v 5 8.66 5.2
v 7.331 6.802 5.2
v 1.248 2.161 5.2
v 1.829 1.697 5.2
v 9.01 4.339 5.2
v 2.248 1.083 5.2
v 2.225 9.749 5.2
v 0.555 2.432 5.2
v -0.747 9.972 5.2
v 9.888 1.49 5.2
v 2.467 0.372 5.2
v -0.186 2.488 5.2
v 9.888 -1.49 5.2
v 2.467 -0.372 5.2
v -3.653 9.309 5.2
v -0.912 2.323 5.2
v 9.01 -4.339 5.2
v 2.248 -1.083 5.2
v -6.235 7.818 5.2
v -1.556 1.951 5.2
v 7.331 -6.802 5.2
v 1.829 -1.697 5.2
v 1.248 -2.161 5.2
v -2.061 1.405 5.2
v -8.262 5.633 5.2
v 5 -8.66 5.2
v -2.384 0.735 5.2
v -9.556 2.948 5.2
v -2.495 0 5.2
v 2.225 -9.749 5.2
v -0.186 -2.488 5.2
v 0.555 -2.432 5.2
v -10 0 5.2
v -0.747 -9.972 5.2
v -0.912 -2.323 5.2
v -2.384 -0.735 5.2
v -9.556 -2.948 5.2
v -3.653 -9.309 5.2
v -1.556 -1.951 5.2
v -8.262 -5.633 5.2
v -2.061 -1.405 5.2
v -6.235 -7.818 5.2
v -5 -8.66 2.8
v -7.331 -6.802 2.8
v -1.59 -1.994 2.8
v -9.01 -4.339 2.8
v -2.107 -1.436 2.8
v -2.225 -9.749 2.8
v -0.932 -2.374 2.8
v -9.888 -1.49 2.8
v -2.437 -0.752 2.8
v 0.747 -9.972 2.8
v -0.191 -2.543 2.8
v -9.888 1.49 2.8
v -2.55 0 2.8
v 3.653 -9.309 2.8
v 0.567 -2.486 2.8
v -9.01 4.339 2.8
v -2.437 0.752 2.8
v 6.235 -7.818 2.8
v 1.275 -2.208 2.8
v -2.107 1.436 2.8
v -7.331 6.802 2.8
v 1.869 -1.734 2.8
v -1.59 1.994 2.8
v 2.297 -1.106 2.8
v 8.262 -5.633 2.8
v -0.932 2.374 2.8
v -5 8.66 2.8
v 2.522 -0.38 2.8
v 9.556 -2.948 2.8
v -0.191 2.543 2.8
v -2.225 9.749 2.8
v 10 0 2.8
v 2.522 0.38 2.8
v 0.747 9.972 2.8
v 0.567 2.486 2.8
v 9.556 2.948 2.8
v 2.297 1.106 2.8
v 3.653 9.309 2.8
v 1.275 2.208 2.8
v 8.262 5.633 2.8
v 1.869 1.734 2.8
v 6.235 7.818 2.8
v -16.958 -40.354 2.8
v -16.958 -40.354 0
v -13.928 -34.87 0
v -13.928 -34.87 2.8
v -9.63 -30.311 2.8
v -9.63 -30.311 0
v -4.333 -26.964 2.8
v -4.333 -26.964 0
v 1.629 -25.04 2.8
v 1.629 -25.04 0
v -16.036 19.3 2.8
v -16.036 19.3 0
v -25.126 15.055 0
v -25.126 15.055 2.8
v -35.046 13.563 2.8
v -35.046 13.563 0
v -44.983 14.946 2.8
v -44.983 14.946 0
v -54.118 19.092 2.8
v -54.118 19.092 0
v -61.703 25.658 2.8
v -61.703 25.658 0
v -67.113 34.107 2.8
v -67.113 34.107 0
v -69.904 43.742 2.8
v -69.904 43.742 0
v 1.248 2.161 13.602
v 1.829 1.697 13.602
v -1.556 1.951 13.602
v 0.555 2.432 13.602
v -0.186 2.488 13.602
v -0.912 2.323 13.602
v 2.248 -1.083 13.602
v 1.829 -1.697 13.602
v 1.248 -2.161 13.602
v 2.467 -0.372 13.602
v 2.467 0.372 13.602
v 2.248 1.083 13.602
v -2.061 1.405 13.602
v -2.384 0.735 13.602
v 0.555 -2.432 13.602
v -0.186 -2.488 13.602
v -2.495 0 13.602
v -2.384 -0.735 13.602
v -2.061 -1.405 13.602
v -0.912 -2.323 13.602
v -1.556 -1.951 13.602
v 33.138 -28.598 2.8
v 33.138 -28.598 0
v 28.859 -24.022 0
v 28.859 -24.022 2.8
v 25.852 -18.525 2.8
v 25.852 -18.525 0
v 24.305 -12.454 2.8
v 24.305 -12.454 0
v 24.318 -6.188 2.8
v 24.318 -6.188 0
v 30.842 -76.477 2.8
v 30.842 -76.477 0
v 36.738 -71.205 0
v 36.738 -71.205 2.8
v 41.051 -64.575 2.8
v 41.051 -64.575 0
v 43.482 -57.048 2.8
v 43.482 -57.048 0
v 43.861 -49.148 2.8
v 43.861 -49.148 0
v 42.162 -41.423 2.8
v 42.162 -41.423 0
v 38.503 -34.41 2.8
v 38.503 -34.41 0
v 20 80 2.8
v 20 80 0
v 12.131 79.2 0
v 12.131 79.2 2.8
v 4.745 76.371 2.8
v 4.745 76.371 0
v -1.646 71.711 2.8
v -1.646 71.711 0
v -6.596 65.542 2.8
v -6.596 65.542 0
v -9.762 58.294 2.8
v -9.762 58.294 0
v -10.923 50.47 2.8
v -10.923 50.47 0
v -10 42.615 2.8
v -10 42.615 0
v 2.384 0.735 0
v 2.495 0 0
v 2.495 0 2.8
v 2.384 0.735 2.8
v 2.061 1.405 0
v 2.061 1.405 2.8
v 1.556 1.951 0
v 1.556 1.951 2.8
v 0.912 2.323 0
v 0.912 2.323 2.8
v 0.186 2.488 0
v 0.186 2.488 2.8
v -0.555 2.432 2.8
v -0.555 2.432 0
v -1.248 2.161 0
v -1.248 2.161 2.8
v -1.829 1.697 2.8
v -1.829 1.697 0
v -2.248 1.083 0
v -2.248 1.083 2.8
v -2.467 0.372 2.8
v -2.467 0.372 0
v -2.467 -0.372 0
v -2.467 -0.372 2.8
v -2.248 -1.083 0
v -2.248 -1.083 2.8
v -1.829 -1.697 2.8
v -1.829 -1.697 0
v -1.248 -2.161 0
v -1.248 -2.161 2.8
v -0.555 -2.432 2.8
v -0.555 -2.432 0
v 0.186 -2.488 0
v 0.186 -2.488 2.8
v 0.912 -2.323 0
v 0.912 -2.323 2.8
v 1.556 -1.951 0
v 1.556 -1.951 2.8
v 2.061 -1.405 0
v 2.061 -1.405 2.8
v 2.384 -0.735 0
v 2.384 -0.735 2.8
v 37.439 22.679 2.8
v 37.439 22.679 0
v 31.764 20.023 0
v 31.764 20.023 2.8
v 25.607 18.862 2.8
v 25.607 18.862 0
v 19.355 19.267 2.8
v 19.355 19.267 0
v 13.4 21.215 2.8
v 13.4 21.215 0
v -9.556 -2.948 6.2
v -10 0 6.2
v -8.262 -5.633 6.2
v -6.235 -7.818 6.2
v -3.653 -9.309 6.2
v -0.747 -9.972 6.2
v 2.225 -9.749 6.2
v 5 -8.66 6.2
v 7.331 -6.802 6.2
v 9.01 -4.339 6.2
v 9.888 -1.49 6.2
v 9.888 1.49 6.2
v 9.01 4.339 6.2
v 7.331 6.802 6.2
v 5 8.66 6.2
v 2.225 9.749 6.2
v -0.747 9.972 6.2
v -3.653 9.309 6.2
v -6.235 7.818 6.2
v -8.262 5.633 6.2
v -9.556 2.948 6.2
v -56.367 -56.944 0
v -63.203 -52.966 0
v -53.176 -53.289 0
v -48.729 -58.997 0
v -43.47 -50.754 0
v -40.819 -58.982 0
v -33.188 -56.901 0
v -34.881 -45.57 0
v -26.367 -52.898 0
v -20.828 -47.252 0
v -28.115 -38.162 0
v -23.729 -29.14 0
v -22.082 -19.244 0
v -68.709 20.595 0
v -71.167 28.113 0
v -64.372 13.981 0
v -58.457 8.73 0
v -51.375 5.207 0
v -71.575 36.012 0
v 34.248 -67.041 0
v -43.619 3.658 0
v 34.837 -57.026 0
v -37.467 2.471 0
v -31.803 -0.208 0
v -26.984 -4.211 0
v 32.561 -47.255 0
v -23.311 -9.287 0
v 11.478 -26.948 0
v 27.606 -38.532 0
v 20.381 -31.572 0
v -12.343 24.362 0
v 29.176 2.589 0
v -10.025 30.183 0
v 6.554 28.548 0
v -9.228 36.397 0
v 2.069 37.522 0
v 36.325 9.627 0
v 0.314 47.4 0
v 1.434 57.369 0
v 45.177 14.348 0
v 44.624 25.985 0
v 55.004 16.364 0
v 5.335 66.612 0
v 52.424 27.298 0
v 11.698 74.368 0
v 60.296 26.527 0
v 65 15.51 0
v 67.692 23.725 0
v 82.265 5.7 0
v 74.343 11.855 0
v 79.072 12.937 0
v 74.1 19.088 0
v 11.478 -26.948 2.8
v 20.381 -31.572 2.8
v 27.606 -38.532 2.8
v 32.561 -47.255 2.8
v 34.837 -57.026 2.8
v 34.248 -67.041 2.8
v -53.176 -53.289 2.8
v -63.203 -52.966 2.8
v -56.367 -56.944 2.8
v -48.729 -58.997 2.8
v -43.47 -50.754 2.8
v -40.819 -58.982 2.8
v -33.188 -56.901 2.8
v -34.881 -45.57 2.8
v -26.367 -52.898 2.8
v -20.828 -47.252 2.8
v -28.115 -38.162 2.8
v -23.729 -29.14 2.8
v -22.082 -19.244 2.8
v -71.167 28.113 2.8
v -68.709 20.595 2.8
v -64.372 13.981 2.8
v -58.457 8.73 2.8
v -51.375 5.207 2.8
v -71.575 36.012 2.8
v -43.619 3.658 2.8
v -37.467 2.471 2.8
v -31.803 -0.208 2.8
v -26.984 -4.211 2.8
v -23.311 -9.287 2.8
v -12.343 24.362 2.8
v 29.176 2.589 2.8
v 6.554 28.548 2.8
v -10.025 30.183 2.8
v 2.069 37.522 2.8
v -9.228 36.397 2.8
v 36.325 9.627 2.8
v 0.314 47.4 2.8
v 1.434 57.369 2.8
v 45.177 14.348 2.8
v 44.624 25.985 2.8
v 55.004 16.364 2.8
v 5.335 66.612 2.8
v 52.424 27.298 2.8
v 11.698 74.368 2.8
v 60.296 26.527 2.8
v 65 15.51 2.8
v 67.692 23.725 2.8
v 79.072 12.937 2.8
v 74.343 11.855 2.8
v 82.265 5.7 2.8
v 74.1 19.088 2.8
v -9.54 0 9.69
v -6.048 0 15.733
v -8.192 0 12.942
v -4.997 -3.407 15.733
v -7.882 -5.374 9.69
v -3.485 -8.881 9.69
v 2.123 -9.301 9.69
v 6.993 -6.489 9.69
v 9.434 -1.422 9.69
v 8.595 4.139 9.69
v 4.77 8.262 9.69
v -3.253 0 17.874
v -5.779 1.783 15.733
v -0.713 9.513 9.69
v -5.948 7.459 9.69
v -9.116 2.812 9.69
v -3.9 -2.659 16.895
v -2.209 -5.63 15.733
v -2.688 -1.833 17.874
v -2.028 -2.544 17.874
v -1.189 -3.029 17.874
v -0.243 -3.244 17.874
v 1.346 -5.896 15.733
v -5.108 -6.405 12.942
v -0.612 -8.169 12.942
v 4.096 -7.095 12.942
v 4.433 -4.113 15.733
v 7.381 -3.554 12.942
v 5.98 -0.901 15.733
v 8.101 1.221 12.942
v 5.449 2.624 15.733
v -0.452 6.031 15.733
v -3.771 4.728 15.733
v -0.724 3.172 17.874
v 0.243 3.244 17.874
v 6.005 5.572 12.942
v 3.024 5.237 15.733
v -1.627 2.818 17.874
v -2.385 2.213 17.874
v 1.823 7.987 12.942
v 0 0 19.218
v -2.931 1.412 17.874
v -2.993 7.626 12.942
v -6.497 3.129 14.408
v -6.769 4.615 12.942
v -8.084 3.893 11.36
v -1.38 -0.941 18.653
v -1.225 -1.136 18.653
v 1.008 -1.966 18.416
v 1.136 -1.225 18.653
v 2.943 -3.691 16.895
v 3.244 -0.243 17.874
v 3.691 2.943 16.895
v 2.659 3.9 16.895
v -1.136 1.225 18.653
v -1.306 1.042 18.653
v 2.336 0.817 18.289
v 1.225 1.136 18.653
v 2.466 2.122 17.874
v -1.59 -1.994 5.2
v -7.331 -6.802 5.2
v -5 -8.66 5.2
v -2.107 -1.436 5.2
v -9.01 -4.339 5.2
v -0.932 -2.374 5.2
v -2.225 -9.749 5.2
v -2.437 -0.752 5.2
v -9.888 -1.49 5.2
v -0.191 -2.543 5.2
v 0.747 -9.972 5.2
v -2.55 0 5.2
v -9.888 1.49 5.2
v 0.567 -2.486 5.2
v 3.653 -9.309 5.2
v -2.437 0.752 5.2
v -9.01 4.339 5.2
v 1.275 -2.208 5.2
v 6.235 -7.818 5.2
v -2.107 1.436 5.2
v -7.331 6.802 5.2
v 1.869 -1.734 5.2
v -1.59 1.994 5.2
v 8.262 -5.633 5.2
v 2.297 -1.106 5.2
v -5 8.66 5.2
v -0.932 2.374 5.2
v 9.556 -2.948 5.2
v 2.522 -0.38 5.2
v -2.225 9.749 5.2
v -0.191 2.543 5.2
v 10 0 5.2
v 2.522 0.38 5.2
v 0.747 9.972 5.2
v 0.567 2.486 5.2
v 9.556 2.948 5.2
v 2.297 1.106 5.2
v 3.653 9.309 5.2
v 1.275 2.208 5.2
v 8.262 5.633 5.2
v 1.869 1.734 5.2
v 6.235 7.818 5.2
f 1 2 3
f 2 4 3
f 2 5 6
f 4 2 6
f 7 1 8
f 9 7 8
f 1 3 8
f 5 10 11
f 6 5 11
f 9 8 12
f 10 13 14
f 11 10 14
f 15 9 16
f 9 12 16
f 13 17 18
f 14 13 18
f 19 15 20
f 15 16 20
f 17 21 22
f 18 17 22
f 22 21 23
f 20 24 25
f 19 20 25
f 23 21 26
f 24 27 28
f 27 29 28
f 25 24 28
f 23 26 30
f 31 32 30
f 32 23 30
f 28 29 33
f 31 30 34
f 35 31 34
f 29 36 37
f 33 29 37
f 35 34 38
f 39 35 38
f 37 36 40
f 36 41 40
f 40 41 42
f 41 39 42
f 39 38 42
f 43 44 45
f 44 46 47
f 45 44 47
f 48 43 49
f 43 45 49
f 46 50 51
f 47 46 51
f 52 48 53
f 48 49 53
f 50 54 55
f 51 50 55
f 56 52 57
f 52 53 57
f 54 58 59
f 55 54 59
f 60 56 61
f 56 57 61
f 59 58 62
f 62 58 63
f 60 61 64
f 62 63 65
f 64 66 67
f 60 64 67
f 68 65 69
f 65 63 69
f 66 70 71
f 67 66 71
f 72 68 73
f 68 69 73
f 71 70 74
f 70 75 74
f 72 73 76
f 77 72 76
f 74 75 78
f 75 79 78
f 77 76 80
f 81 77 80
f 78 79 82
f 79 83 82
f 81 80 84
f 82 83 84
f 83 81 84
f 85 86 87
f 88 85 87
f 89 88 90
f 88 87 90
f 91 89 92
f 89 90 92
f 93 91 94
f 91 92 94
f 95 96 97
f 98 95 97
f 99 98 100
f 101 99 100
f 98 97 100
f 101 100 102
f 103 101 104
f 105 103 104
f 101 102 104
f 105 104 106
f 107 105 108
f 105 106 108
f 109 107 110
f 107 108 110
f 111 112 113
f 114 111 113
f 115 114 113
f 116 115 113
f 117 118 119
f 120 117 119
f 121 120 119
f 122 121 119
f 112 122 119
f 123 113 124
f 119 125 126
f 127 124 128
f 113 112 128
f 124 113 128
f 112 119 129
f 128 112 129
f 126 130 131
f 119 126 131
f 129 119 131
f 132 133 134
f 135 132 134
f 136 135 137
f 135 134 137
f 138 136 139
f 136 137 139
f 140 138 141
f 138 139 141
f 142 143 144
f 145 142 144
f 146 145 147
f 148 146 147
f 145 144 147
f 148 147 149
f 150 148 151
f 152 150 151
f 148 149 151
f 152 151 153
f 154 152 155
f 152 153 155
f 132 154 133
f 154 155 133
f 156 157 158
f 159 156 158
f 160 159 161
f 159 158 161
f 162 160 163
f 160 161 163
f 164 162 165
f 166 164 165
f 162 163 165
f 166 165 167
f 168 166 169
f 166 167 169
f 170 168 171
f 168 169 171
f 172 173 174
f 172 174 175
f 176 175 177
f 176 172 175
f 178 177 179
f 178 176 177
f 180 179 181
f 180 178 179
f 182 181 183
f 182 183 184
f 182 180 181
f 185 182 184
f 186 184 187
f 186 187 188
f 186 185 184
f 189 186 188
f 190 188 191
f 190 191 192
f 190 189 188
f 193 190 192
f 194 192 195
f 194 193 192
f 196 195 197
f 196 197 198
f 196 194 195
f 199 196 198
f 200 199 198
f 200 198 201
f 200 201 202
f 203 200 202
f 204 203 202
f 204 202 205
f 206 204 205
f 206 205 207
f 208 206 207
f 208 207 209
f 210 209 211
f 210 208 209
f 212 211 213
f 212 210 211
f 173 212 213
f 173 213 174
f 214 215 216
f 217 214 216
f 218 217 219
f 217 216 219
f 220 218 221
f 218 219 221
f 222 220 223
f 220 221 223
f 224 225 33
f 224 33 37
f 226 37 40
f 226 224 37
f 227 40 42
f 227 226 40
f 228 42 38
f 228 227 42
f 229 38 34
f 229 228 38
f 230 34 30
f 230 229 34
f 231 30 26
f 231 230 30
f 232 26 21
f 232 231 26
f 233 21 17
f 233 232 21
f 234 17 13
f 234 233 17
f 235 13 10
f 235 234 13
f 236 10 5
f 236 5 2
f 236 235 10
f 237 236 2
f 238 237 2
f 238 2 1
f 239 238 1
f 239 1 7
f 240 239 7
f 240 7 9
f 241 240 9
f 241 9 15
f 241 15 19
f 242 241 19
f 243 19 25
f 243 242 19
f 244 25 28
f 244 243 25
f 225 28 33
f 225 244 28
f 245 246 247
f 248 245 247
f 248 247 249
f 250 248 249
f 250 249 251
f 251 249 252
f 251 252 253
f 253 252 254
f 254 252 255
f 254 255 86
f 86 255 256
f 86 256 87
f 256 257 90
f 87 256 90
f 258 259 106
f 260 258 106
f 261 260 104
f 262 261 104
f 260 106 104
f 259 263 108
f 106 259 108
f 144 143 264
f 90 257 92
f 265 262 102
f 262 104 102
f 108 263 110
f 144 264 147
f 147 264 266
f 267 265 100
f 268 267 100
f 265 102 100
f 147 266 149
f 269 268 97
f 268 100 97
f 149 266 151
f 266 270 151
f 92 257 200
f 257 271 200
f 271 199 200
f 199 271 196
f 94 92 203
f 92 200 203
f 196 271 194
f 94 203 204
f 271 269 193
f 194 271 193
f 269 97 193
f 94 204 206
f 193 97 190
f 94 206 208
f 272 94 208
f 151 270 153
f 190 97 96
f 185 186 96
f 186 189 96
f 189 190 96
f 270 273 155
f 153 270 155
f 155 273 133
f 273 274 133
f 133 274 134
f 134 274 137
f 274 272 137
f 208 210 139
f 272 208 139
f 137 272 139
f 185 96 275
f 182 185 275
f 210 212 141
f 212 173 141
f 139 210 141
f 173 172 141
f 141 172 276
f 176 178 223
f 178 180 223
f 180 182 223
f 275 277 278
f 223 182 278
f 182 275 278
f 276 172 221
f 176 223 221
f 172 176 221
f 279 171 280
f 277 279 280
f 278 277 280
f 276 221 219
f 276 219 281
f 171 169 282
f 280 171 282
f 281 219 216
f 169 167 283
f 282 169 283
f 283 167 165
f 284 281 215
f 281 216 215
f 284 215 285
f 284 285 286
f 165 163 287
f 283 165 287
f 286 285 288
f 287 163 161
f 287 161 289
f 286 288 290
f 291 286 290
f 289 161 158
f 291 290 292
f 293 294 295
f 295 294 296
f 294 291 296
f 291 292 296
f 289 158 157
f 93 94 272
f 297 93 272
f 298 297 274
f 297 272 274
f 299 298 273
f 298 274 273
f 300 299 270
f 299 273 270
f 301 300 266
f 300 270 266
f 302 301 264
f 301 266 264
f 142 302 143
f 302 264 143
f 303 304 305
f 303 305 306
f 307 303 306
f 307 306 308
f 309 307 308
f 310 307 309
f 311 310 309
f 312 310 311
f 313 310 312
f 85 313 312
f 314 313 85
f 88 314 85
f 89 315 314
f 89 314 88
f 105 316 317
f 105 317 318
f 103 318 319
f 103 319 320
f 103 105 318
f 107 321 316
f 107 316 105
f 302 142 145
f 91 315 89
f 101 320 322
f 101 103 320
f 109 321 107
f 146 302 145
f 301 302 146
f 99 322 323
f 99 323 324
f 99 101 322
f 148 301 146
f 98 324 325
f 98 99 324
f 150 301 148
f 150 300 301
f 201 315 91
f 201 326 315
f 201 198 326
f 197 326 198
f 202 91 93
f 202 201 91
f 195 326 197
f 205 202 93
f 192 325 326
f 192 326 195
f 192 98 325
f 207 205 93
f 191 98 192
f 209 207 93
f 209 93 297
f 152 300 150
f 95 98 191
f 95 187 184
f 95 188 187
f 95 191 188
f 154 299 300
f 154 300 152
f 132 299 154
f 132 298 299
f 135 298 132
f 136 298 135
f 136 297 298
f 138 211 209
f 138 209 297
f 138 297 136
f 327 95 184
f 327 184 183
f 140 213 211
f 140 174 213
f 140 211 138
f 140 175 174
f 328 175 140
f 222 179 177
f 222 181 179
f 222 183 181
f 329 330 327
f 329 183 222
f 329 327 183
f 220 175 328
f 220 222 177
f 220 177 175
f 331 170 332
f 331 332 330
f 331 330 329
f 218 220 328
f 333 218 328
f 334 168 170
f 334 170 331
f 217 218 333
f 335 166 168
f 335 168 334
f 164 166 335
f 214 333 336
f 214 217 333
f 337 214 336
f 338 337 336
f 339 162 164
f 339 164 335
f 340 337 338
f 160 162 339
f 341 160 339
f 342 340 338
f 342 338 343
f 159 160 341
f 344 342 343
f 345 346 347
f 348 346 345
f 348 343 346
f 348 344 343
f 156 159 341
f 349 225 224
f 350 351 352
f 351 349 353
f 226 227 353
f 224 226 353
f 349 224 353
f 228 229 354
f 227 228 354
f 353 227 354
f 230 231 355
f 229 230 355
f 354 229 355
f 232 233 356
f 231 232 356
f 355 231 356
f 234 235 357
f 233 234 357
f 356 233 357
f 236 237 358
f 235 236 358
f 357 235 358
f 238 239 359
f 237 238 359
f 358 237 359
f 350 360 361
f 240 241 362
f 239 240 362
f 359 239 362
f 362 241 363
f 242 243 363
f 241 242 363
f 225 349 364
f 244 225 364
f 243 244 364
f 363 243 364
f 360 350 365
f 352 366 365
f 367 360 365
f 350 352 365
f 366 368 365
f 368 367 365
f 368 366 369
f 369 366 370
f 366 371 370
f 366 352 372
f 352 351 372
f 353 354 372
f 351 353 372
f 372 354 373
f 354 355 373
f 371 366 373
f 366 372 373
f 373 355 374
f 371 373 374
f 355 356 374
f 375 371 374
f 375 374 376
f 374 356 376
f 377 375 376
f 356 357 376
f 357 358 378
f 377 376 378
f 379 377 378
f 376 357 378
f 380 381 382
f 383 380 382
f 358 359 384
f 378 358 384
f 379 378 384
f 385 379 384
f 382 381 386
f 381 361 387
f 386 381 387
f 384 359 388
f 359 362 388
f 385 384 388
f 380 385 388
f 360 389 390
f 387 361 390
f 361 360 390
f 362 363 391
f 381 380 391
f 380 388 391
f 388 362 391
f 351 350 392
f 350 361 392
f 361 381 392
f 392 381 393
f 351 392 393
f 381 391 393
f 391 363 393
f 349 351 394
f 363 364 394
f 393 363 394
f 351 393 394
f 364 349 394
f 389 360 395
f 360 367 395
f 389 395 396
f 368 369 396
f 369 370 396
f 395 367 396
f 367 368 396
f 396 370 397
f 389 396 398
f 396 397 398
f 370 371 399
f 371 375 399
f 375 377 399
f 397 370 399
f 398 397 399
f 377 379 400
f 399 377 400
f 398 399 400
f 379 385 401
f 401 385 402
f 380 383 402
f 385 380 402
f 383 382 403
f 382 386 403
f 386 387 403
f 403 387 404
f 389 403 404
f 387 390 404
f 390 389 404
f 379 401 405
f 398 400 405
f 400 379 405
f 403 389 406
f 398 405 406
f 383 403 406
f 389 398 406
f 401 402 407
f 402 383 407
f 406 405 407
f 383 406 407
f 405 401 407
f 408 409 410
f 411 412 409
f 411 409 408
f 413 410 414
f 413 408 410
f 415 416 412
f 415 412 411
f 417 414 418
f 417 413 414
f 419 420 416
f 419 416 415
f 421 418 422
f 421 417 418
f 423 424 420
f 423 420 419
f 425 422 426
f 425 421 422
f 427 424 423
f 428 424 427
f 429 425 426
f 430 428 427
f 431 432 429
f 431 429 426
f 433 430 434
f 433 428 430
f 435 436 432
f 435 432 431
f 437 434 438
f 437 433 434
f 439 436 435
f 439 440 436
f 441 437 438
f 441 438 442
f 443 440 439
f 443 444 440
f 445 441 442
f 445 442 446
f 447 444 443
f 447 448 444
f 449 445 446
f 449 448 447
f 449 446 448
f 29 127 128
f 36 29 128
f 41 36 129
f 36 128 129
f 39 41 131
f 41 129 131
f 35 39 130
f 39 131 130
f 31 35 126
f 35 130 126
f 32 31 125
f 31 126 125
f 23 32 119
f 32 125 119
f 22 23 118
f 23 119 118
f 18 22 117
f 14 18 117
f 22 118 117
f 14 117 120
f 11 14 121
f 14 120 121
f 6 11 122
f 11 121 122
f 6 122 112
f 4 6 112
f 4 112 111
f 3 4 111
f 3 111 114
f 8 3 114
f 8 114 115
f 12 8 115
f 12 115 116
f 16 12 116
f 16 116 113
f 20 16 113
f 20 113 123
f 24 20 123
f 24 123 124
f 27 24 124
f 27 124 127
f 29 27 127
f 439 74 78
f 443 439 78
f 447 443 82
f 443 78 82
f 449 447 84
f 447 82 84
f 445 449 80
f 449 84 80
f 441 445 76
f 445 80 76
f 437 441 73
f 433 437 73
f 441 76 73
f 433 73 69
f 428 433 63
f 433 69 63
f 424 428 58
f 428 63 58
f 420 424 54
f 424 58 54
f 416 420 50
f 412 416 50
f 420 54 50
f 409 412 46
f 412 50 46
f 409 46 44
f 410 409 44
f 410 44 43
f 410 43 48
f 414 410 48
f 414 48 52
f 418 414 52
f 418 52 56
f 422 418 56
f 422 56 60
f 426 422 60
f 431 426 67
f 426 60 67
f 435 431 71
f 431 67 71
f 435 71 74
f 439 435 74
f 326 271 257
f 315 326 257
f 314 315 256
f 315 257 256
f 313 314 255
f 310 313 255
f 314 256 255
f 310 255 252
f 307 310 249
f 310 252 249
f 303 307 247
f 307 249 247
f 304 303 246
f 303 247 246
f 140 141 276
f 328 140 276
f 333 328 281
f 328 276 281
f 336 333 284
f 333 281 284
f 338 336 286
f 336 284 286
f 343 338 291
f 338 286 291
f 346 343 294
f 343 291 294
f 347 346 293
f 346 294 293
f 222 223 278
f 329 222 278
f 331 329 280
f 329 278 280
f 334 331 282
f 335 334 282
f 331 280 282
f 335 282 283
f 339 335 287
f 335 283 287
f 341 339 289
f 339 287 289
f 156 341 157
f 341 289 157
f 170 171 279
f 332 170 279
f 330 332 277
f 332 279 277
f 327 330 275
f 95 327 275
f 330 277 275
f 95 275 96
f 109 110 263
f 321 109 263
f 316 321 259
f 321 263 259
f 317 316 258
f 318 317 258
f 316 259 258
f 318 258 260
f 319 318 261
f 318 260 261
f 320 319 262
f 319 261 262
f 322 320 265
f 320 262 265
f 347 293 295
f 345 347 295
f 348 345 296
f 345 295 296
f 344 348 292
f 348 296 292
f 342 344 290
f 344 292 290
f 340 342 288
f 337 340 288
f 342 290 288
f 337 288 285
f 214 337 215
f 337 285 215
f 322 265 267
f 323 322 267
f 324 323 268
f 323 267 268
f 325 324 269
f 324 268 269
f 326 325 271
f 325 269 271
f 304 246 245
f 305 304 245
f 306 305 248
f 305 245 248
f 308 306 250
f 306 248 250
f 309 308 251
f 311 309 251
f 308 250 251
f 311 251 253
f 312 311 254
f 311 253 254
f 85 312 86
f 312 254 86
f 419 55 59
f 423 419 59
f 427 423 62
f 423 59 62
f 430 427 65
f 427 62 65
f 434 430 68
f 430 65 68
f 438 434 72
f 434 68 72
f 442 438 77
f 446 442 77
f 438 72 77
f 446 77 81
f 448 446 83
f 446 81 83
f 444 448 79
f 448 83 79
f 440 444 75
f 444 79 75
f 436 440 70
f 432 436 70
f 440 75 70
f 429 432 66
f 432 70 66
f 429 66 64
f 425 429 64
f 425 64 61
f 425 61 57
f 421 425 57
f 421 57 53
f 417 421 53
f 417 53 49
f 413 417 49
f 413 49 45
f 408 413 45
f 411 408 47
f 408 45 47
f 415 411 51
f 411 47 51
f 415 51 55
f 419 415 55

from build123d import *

# Parameters (mm, degrees)
F0_R     = 2.495
F1_DEPTH = 2.8
F3_DEPTH = 2.4
F5_DEPTH = 1
F6_W     = 7.505
F6_H     = 1


with BuildPart() as f1:
    # F0 (on Top) → F1 (new body)
    with BuildSketch(Plane.XY):
        with BuildLine():
            ThreePointArc((-22.7858082993, 10.2862500528), (-20.3407682899, 14.5345500576), (-17.1137876985, 18.2241123408))
            ThreePointArc((-17.1137876985, 18.2241123408), (-16.5666860585, 18.7537908739), (-16.0359703203, 19.2998864317))
            ThreePointArc((-16.0359703203, 19.2998864317), (-49.6996912533, 16.6900208036), (-69.9041814161, 43.7424898759))
            ThreePointArc((-69.9041814161, 43.7424898759), (-66.7598038962, 17.1440537541), (-43.6190942577, 3.6580806138))
            ThreePointArc((-43.6190942577, 3.6580806138), (-32.5771806136, 5.0068500705), (-22.7858082993, 10.2862500528))
        make_face()
        with BuildLine():
            ThreePointArc((-23.7810968086, -7.7109943963), (-24.9618581995, 1.3804474739), (-22.7858082993, 10.2862500528))
            ThreePointArc((-22.7858082993, 10.2862500528), (-32.5771806136, 5.0068500705), (-43.6190942577, 3.6580806138))
            ThreePointArc((-43.6190942577, 3.6580806138), (-31.8033376807, -0.2078903454), (-23.3106701049, -9.2871211714))
            ThreePointArc((-23.3106701049, -9.2871211714), (-23.5366233714, -8.4962939253), (-23.7810968086, -7.7109943963))
        make_face()
        with BuildLine():
            ThreePointArc((-14.6823545264, 20.2343387725), (-6.4007548293, 24.1667196288), (2.7416031459, 24.8492175368))
            ThreePointArc((2.7416031459, 24.8492175368), (-5.3051050528, 32.5299416652), (-10, 42.6146329052))
            ThreePointArc((-10, 42.6146329052), (-10.0254872889, 30.1825298915), (-16.0359703203, 19.2998864317))
            ThreePointArc((-16.0359703203, 19.2998864317), (-15.353672314, 19.7591598168), (-14.6823545264, 20.2343387725))
        make_face()
        with BuildLine():
            ThreePointArc((-17.1137876985, 18.2241123408), (-15.9298122297, 19.2676174533), (-14.6823545264, 20.2343387725))
            ThreePointArc((-14.6823545264, 20.2343387725), (-15.353672314, 19.7591598168), (-16.0359703203, 19.2998864317))
            ThreePointArc((-16.0359703203, 19.2998864317), (-16.5666860585, 18.7537908739), (-17.1137876985, 18.2241123408))
        make_face()
        with BuildLine():
            ThreePointArc((24.5572095563, -4.684384571), (24.8890562186, -2.3526326842), (25, 0))
            ThreePointArc((25, 0), (24.8697135657, 2.5489894392), (24.4802122271, 5.0714109788))
            ThreePointArc((24.4802122271, 5.0714109788), (21.0059741613, 13.5554066532), (14.7069026764, 20.2165034976))
            ThreePointArc((14.7069026764, 20.2165034976), (13.4020104362, 21.1041729586), (12.0437095584, 21.9077397299))
            ThreePointArc((12.0437095584, 21.9077397299), (7.5375354635, 23.8366432019), (2.7416031459, 24.8492175368))
            ThreePointArc((2.7416031459, 24.8492175368), (-6.4007548293, 24.1667196288), (-14.6823545264, 20.2343387725))
            ThreePointArc((-14.6823545264, 20.2343387725), (-15.9298122297, 19.2676174533), (-17.1137876985, 18.2241123408))
            ThreePointArc((-17.1137876985, 18.2241123408), (-20.3407682899, 14.5345500576), (-22.7858082993, 10.2862500528))
            ThreePointArc((-22.7858082993, 10.2862500528), (-24.9618581995, 1.3804474739), (-23.7810968086, -7.7109943963))
            ThreePointArc((-23.7810968086, -7.7109943963), (-23.2471758286, -9.1961304903), (-22.6206120324, -10.6446188885))
            ThreePointArc((-22.6206120324, -10.6446188885), (-20.1088216239, -14.8537972551), (-16.824007136, -18.4919653874))
            ThreePointArc((-16.824007136, -18.4919653874), (-9.0265219603, -23.3135561702), (-0.015171591, -24.9999953965))
            ThreePointArc((-0.015171591, -24.9999953965), (1.5622674252, -24.9511386612), (3.1334806162, -24.8028486112))
            ThreePointArc((3.1334806162, -24.8028486112), (7.9128330526, -23.7147016233), (12.3880000622, -21.714913181))
            ThreePointArc((12.3880000622, -21.714913181), (19.3831608278, -15.7890175857), (23.7717202497, -7.7398524773))
            ThreePointArc((23.7717202497, -7.7398524773), (24.2127101969, -6.2245212604), (24.5572095563, -4.684384571))
        make_face()
        Circle(F0_R, mode=Mode.SUBTRACT)
        with BuildLine():
            ThreePointArc((2.7416031459, 24.8492175368), (7.5375354635, 23.8366432019), (12.0437095584, 21.9077397299))
            ThreePointArc((12.0437095584, 21.9077397299), (12.7165274833, 21.5510948184), (13.3998954043, 21.2151069652))
            ThreePointArc((13.3998954043, 21.2151069652), (0.5151038299, 52.4247152891), (20, 80))
            ThreePointArc((20, 80), (-4.3249499065, 68.7901504845), (-10, 42.6146329052))
            ThreePointArc((-10, 42.6146329052), (-5.3051050528, 32.5299416652), (2.7416031459, 24.8492175368))
        make_face()
        with BuildLine():
            ThreePointArc((14.7069026764, 20.2165034976), (21.0059741613, 13.5554066532), (24.4802122271, 5.0714109788))
            ThreePointArc((24.4802122271, 5.0714109788), (29.2984453771, 15.0977595306), (37.4387543702, 22.6792109397))
            ThreePointArc((37.4387543702, 22.6792109397), (25.6072457824, 18.8617196848), (13.3998954043, 21.2151069652))
            ThreePointArc((13.3998954043, 21.2151069652), (14.0475320292, 20.7081262812), (14.7069026764, 20.2165034976))
        make_face()
        with BuildLine():
            ThreePointArc((24.4802122271, 5.0714109788), (24.8697135657, 2.5489894392), (25, 0))
            ThreePointArc((25, 0), (24.8890562186, -2.3526326842), (24.5572095563, -4.684384571))
            ThreePointArc((24.5572095563, -4.684384571), (24.4259322621, -5.4344817814), (24.3175611259, -6.1882292523))
            ThreePointArc((24.3175611259, -6.1882292523), (50.0180429279, 15.7102350956), (82.2648611911, 5.7002292241))
            ThreePointArc((82.2648611911, 5.7002292241), (64.0868378543, 25.3705973366), (37.4387543702, 22.6792109397))
            ThreePointArc((37.4387543702, 22.6792109397), (29.2984453771, 15.0977595306), (24.4802122271, 5.0714109788))
        make_face()
        with BuildLine():
            ThreePointArc((24.3175611259, -6.1882292523), (24.0355245661, -6.9608339317), (23.7717202497, -7.7398524773))
            ThreePointArc((23.7717202497, -7.7398524773), (19.3831608278, -15.7890175857), (12.3880000622, -21.714913181))
            ThreePointArc((12.3880000622, -21.714913181), (23.4125401133, -23.1990131213), (33.1384226973, -28.5981097064))
            ThreePointArc((33.1384226973, -28.5981097064), (25.8516355407, -18.52534604), (24.3175611259, -6.1882292523))
        make_face()
        with BuildLine():
            ThreePointArc((33.1384226973, -28.5981097064), (23.4125401133, -23.1990131213), (12.3880000622, -21.714913181))
            ThreePointArc((12.3880000622, -21.714913181), (7.9128330526, -23.7147016233), (3.1334806162, -24.8028486112))
            ThreePointArc((3.1334806162, -24.8028486112), (2.3795288615, -24.9097892705), (1.629183895, -25.0396429732))
            ThreePointArc((1.629183895, -25.0396429732), (30.3977467503, -42.7152560287), (30.8424802959, -76.4770645958))
            ThreePointArc((30.8424802959, -76.4770645958), (43.932793932, -53.1102590157), (33.1384226973, -28.5981097064))
        make_face()
        with BuildLine():
            ThreePointArc((1.629183895, -25.0396429732), (0.8072390901, -25.0101582411), (-0.015171591, -24.9999953965))
            ThreePointArc((-0.015171591, -24.9999953965), (-9.0265219603, -23.3135561702), (-16.824007136, -18.4919653874))
            ThreePointArc((-16.824007136, -18.4919653874), (-14.8286998241, -29.435538145), (-16.9580828098, -40.3538147522))
            ThreePointArc((-16.9580828098, -40.3538147522), (-9.6300563535, -30.3110131909), (1.629183895, -25.0396429732))
        make_face()
        with BuildLine():
            ThreePointArc((-16.9580828098, -40.3538147522), (-14.8286998241, -29.435538145), (-16.824007136, -18.4919653874))
            ThreePointArc((-16.824007136, -18.4919653874), (-20.1088216239, -14.8537972551), (-22.6206120324, -10.6446188885))
            ThreePointArc((-22.6206120324, -10.6446188885), (-22.9553025485, -9.9606146404), (-23.3106701049, -9.2871211714))
            ThreePointArc((-23.3106701049, -9.2871211714), (-31.2312022548, -42.1097151595), (-63.2031600709, -52.9656545041))
            ThreePointArc((-63.2031600709, -52.9656545041), (-36.9348779836, -58.1945425595), (-16.9580828098, -40.3538147522))
        make_face()
        with BuildLine():
            ThreePointArc((-23.3106701049, -9.2871211714), (-22.9553025485, -9.9606146404), (-22.6206120324, -10.6446188885))
            ThreePointArc((-22.6206120324, -10.6446188885), (-23.2471758286, -9.1961304903), (-23.7810968086, -7.7109943963))
            ThreePointArc((-23.7810968086, -7.7109943963), (-23.5366233714, -8.4962939253), (-23.3106701049, -9.2871211714))
        make_face()
        with BuildLine():
            ThreePointArc((1.629183895, -25.0396429732), (2.3795288615, -24.9097892705), (3.1334806162, -24.8028486112))
            ThreePointArc((3.1334806162, -24.8028486112), (1.5622674252, -24.9511386612), (-0.015171591, -24.9999953965))
            ThreePointArc((-0.015171591, -24.9999953965), (0.8072390901, -25.0101582411), (1.629183895, -25.0396429732))
        make_face()
        with BuildLine():
            ThreePointArc((24.3175611259, -6.1882292523), (24.4259322621, -5.4344817814), (24.5572095563, -4.684384571))
            ThreePointArc((24.5572095563, -4.684384571), (24.2127101969, -6.2245212604), (23.7717202497, -7.7398524773))
            ThreePointArc((23.7717202497, -7.7398524773), (24.0355245661, -6.9608339317), (24.3175611259, -6.1882292523))
        make_face()
        with BuildLine():
            ThreePointArc((12.0437095584, 21.9077397299), (13.4020104362, 21.1041729586), (14.7069026764, 20.2165034976))
            ThreePointArc((14.7069026764, 20.2165034976), (14.0475320292, 20.7081262812), (13.3998954043, 21.2151069652))
            ThreePointArc((13.3998954043, 21.2151069652), (12.7165274833, 21.5510948184), (12.0437095584, 21.9077397299))
        make_face()
    extrude(amount=F1_DEPTH)


with BuildPart() as f3:
    # F2 (on face) → F3 (new body)
    with BuildSketch(Plane.XY.offset(2.8)):
        with BuildLine():
            Line((10, 0), (2.55, 0))
            ThreePointArc((2.55, 0), (0, -2.55), (-2.55, 0))
            Line((-2.55, 0), (-10, 0))
            ThreePointArc((-10, 0), (0, -10), (10, 0))
        make_face()
        with BuildLine():
            ThreePointArc((-2.55, 0), (0, 2.55), (2.55, 0))
            Line((2.55, 0), (10, 0))
            ThreePointArc((10, 0), (0, 10), (-10, 0))
            Line((-10, 0), (-2.55, 0))
        make_face()
    extrude(amount=F3_DEPTH)


with BuildPart() as f5:
    # F4 (on face) → F5 (new body)
    with BuildSketch(Plane.XY.offset(5.2)):
        with BuildLine():
            ThreePointArc((10, 0), (0, 10), (-10, 0))
            Line((-10, 0), (-2.55, 0))
            ThreePointArc((-2.55, 0), (0, 2.55), (2.55, 0))
            Line((2.55, 0), (10, 0))
        make_face()
        with BuildLine():
            ThreePointArc((2.55, 0), (0, 2.55), (-2.55, 0))
            Line((-2.55, 0), (-2.495, 0))
            ThreePointArc((-2.495, 0), (0, 2.495), (2.495, 0))
            Line((2.495, 0), (2.55, 0))
        make_face()
    extrude(amount=F5_DEPTH)

    # F6 (on face) → F7 (revolve)
    with BuildSketch(Plane.XZ):
        with Locations((-6.2475, 5.7)):
            Rectangle(F6_W, F6_H)
        with BuildLine():
            ThreePointArc((0, 19.2180700541), (-7.2114289431, 14.4077729612), (-10, 6.2))
            Line((-10, 6.2), (-2.495, 6.2))
            Line((-2.495, 6.2), (-2.495, 13.6019121855))
            Line((-2.495, 13.6019121855), (0, 13.6019121855))
            Line((0, 13.6019121855), (0, 19.2180700541))
        make_face()
    revolve(axis=Axis((0, 0, 12.209035027), (0, 0, 1)))


solid = Compound([f1.part, f3.part, f5.part])
